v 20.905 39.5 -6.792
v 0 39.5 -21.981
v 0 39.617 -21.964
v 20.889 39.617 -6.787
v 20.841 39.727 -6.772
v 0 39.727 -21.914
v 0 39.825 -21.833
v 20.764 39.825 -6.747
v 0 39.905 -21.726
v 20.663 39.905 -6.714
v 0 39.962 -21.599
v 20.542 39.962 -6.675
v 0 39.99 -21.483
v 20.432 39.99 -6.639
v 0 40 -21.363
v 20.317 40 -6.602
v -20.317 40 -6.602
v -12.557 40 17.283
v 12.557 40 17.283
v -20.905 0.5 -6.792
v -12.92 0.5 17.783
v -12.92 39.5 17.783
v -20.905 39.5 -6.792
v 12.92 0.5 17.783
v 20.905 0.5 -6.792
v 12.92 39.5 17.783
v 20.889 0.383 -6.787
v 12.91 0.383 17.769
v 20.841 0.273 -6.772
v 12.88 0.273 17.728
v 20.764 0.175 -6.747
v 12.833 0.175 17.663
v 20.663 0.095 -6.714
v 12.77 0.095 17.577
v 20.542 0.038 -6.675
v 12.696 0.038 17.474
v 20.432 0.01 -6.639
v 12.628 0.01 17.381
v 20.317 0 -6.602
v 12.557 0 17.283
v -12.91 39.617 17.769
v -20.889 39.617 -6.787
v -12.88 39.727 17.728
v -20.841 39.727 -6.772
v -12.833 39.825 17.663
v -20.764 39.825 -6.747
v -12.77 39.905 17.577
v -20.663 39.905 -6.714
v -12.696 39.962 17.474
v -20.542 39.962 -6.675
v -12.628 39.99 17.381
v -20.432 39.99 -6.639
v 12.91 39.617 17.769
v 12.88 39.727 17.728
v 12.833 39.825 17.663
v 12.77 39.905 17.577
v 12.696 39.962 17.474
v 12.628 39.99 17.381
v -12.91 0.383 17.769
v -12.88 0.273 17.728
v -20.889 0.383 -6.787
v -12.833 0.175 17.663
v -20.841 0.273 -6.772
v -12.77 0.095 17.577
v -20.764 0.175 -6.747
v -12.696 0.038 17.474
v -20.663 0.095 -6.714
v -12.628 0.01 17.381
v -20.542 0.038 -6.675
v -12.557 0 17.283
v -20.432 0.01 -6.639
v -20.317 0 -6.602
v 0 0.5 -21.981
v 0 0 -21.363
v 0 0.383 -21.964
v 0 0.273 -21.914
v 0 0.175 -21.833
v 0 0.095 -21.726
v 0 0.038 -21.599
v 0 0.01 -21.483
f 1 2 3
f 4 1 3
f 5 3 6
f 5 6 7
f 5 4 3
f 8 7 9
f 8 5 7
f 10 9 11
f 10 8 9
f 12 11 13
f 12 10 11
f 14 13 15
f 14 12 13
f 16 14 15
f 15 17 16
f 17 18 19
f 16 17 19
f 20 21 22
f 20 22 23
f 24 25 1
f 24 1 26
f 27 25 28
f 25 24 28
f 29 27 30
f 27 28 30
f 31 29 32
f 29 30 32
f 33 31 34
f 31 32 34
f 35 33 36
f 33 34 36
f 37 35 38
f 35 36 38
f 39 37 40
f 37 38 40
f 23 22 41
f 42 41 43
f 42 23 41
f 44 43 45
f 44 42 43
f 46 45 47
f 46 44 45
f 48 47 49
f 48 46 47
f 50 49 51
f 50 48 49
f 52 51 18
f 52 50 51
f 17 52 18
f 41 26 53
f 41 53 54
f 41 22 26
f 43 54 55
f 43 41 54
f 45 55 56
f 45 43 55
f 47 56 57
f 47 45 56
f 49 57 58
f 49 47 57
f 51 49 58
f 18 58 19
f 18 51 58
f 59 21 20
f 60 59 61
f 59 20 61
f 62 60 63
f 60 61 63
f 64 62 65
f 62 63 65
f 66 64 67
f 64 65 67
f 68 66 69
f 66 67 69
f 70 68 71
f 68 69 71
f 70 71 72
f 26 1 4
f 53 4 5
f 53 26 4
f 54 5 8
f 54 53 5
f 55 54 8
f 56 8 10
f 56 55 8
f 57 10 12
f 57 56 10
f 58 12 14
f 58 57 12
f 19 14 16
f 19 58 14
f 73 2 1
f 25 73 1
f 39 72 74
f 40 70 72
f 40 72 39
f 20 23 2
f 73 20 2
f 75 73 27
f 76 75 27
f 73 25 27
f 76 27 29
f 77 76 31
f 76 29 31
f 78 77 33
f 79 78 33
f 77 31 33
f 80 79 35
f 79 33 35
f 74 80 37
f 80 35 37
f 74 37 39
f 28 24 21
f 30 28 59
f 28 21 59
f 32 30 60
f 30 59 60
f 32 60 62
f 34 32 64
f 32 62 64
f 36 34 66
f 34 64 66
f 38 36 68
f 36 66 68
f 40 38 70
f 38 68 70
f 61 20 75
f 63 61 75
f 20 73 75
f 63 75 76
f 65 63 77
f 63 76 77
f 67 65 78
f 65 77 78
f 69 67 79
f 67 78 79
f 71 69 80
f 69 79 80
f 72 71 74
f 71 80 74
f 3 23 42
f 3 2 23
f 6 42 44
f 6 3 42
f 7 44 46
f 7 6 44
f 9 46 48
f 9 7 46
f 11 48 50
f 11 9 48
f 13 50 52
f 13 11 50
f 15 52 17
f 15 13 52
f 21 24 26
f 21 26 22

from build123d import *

# Parameters (mm, degrees)
BOSS_EXTRUDE1_DEPTH = 40
FILLET1_R           = 0.5


with BuildPart() as part:
    # Sketch1 → Boss-Extrude1 (new body)
    with BuildSketch(Plane(origin=(0, 0, 0), x_dir=(-1, 0, 0), z_dir=(0, 1, 0))):
        Polygon((12.920084942, 17.782971123), (20.905136432, -6.792490393), (2.28e-07, -21.980960899), (-20.905135976, -6.792490393), (-12.920084486, 17.782971123), align=None)
    extrude(amount=BOSS_EXTRUDE1_DEPTH)

    # Fillet1
    fillet1_edges = [part.edges().sort_by_distance(p)[0] for p in [
        (10.452567874, 40, -14.386725646),
        (-10.45256833, 40, -14.386725646),
        (-16.912610687, 40, 5.495240365),
        (-2.28e-07, 40, 17.782971123),
        (-16.912610687, 0, 5.495240365),
        (-10.45256833, 0, -14.386725646),
        (10.452567874, 0, -14.386725646),
        (16.912610231, 0, 5.495240365),
        (-2.28e-07, 0, 17.782971123),
        (16.912610231, 40, 5.495240365),
    ]]
    fillet(fillet1_edges, radius=FILLET1_R)


solid = part.part
